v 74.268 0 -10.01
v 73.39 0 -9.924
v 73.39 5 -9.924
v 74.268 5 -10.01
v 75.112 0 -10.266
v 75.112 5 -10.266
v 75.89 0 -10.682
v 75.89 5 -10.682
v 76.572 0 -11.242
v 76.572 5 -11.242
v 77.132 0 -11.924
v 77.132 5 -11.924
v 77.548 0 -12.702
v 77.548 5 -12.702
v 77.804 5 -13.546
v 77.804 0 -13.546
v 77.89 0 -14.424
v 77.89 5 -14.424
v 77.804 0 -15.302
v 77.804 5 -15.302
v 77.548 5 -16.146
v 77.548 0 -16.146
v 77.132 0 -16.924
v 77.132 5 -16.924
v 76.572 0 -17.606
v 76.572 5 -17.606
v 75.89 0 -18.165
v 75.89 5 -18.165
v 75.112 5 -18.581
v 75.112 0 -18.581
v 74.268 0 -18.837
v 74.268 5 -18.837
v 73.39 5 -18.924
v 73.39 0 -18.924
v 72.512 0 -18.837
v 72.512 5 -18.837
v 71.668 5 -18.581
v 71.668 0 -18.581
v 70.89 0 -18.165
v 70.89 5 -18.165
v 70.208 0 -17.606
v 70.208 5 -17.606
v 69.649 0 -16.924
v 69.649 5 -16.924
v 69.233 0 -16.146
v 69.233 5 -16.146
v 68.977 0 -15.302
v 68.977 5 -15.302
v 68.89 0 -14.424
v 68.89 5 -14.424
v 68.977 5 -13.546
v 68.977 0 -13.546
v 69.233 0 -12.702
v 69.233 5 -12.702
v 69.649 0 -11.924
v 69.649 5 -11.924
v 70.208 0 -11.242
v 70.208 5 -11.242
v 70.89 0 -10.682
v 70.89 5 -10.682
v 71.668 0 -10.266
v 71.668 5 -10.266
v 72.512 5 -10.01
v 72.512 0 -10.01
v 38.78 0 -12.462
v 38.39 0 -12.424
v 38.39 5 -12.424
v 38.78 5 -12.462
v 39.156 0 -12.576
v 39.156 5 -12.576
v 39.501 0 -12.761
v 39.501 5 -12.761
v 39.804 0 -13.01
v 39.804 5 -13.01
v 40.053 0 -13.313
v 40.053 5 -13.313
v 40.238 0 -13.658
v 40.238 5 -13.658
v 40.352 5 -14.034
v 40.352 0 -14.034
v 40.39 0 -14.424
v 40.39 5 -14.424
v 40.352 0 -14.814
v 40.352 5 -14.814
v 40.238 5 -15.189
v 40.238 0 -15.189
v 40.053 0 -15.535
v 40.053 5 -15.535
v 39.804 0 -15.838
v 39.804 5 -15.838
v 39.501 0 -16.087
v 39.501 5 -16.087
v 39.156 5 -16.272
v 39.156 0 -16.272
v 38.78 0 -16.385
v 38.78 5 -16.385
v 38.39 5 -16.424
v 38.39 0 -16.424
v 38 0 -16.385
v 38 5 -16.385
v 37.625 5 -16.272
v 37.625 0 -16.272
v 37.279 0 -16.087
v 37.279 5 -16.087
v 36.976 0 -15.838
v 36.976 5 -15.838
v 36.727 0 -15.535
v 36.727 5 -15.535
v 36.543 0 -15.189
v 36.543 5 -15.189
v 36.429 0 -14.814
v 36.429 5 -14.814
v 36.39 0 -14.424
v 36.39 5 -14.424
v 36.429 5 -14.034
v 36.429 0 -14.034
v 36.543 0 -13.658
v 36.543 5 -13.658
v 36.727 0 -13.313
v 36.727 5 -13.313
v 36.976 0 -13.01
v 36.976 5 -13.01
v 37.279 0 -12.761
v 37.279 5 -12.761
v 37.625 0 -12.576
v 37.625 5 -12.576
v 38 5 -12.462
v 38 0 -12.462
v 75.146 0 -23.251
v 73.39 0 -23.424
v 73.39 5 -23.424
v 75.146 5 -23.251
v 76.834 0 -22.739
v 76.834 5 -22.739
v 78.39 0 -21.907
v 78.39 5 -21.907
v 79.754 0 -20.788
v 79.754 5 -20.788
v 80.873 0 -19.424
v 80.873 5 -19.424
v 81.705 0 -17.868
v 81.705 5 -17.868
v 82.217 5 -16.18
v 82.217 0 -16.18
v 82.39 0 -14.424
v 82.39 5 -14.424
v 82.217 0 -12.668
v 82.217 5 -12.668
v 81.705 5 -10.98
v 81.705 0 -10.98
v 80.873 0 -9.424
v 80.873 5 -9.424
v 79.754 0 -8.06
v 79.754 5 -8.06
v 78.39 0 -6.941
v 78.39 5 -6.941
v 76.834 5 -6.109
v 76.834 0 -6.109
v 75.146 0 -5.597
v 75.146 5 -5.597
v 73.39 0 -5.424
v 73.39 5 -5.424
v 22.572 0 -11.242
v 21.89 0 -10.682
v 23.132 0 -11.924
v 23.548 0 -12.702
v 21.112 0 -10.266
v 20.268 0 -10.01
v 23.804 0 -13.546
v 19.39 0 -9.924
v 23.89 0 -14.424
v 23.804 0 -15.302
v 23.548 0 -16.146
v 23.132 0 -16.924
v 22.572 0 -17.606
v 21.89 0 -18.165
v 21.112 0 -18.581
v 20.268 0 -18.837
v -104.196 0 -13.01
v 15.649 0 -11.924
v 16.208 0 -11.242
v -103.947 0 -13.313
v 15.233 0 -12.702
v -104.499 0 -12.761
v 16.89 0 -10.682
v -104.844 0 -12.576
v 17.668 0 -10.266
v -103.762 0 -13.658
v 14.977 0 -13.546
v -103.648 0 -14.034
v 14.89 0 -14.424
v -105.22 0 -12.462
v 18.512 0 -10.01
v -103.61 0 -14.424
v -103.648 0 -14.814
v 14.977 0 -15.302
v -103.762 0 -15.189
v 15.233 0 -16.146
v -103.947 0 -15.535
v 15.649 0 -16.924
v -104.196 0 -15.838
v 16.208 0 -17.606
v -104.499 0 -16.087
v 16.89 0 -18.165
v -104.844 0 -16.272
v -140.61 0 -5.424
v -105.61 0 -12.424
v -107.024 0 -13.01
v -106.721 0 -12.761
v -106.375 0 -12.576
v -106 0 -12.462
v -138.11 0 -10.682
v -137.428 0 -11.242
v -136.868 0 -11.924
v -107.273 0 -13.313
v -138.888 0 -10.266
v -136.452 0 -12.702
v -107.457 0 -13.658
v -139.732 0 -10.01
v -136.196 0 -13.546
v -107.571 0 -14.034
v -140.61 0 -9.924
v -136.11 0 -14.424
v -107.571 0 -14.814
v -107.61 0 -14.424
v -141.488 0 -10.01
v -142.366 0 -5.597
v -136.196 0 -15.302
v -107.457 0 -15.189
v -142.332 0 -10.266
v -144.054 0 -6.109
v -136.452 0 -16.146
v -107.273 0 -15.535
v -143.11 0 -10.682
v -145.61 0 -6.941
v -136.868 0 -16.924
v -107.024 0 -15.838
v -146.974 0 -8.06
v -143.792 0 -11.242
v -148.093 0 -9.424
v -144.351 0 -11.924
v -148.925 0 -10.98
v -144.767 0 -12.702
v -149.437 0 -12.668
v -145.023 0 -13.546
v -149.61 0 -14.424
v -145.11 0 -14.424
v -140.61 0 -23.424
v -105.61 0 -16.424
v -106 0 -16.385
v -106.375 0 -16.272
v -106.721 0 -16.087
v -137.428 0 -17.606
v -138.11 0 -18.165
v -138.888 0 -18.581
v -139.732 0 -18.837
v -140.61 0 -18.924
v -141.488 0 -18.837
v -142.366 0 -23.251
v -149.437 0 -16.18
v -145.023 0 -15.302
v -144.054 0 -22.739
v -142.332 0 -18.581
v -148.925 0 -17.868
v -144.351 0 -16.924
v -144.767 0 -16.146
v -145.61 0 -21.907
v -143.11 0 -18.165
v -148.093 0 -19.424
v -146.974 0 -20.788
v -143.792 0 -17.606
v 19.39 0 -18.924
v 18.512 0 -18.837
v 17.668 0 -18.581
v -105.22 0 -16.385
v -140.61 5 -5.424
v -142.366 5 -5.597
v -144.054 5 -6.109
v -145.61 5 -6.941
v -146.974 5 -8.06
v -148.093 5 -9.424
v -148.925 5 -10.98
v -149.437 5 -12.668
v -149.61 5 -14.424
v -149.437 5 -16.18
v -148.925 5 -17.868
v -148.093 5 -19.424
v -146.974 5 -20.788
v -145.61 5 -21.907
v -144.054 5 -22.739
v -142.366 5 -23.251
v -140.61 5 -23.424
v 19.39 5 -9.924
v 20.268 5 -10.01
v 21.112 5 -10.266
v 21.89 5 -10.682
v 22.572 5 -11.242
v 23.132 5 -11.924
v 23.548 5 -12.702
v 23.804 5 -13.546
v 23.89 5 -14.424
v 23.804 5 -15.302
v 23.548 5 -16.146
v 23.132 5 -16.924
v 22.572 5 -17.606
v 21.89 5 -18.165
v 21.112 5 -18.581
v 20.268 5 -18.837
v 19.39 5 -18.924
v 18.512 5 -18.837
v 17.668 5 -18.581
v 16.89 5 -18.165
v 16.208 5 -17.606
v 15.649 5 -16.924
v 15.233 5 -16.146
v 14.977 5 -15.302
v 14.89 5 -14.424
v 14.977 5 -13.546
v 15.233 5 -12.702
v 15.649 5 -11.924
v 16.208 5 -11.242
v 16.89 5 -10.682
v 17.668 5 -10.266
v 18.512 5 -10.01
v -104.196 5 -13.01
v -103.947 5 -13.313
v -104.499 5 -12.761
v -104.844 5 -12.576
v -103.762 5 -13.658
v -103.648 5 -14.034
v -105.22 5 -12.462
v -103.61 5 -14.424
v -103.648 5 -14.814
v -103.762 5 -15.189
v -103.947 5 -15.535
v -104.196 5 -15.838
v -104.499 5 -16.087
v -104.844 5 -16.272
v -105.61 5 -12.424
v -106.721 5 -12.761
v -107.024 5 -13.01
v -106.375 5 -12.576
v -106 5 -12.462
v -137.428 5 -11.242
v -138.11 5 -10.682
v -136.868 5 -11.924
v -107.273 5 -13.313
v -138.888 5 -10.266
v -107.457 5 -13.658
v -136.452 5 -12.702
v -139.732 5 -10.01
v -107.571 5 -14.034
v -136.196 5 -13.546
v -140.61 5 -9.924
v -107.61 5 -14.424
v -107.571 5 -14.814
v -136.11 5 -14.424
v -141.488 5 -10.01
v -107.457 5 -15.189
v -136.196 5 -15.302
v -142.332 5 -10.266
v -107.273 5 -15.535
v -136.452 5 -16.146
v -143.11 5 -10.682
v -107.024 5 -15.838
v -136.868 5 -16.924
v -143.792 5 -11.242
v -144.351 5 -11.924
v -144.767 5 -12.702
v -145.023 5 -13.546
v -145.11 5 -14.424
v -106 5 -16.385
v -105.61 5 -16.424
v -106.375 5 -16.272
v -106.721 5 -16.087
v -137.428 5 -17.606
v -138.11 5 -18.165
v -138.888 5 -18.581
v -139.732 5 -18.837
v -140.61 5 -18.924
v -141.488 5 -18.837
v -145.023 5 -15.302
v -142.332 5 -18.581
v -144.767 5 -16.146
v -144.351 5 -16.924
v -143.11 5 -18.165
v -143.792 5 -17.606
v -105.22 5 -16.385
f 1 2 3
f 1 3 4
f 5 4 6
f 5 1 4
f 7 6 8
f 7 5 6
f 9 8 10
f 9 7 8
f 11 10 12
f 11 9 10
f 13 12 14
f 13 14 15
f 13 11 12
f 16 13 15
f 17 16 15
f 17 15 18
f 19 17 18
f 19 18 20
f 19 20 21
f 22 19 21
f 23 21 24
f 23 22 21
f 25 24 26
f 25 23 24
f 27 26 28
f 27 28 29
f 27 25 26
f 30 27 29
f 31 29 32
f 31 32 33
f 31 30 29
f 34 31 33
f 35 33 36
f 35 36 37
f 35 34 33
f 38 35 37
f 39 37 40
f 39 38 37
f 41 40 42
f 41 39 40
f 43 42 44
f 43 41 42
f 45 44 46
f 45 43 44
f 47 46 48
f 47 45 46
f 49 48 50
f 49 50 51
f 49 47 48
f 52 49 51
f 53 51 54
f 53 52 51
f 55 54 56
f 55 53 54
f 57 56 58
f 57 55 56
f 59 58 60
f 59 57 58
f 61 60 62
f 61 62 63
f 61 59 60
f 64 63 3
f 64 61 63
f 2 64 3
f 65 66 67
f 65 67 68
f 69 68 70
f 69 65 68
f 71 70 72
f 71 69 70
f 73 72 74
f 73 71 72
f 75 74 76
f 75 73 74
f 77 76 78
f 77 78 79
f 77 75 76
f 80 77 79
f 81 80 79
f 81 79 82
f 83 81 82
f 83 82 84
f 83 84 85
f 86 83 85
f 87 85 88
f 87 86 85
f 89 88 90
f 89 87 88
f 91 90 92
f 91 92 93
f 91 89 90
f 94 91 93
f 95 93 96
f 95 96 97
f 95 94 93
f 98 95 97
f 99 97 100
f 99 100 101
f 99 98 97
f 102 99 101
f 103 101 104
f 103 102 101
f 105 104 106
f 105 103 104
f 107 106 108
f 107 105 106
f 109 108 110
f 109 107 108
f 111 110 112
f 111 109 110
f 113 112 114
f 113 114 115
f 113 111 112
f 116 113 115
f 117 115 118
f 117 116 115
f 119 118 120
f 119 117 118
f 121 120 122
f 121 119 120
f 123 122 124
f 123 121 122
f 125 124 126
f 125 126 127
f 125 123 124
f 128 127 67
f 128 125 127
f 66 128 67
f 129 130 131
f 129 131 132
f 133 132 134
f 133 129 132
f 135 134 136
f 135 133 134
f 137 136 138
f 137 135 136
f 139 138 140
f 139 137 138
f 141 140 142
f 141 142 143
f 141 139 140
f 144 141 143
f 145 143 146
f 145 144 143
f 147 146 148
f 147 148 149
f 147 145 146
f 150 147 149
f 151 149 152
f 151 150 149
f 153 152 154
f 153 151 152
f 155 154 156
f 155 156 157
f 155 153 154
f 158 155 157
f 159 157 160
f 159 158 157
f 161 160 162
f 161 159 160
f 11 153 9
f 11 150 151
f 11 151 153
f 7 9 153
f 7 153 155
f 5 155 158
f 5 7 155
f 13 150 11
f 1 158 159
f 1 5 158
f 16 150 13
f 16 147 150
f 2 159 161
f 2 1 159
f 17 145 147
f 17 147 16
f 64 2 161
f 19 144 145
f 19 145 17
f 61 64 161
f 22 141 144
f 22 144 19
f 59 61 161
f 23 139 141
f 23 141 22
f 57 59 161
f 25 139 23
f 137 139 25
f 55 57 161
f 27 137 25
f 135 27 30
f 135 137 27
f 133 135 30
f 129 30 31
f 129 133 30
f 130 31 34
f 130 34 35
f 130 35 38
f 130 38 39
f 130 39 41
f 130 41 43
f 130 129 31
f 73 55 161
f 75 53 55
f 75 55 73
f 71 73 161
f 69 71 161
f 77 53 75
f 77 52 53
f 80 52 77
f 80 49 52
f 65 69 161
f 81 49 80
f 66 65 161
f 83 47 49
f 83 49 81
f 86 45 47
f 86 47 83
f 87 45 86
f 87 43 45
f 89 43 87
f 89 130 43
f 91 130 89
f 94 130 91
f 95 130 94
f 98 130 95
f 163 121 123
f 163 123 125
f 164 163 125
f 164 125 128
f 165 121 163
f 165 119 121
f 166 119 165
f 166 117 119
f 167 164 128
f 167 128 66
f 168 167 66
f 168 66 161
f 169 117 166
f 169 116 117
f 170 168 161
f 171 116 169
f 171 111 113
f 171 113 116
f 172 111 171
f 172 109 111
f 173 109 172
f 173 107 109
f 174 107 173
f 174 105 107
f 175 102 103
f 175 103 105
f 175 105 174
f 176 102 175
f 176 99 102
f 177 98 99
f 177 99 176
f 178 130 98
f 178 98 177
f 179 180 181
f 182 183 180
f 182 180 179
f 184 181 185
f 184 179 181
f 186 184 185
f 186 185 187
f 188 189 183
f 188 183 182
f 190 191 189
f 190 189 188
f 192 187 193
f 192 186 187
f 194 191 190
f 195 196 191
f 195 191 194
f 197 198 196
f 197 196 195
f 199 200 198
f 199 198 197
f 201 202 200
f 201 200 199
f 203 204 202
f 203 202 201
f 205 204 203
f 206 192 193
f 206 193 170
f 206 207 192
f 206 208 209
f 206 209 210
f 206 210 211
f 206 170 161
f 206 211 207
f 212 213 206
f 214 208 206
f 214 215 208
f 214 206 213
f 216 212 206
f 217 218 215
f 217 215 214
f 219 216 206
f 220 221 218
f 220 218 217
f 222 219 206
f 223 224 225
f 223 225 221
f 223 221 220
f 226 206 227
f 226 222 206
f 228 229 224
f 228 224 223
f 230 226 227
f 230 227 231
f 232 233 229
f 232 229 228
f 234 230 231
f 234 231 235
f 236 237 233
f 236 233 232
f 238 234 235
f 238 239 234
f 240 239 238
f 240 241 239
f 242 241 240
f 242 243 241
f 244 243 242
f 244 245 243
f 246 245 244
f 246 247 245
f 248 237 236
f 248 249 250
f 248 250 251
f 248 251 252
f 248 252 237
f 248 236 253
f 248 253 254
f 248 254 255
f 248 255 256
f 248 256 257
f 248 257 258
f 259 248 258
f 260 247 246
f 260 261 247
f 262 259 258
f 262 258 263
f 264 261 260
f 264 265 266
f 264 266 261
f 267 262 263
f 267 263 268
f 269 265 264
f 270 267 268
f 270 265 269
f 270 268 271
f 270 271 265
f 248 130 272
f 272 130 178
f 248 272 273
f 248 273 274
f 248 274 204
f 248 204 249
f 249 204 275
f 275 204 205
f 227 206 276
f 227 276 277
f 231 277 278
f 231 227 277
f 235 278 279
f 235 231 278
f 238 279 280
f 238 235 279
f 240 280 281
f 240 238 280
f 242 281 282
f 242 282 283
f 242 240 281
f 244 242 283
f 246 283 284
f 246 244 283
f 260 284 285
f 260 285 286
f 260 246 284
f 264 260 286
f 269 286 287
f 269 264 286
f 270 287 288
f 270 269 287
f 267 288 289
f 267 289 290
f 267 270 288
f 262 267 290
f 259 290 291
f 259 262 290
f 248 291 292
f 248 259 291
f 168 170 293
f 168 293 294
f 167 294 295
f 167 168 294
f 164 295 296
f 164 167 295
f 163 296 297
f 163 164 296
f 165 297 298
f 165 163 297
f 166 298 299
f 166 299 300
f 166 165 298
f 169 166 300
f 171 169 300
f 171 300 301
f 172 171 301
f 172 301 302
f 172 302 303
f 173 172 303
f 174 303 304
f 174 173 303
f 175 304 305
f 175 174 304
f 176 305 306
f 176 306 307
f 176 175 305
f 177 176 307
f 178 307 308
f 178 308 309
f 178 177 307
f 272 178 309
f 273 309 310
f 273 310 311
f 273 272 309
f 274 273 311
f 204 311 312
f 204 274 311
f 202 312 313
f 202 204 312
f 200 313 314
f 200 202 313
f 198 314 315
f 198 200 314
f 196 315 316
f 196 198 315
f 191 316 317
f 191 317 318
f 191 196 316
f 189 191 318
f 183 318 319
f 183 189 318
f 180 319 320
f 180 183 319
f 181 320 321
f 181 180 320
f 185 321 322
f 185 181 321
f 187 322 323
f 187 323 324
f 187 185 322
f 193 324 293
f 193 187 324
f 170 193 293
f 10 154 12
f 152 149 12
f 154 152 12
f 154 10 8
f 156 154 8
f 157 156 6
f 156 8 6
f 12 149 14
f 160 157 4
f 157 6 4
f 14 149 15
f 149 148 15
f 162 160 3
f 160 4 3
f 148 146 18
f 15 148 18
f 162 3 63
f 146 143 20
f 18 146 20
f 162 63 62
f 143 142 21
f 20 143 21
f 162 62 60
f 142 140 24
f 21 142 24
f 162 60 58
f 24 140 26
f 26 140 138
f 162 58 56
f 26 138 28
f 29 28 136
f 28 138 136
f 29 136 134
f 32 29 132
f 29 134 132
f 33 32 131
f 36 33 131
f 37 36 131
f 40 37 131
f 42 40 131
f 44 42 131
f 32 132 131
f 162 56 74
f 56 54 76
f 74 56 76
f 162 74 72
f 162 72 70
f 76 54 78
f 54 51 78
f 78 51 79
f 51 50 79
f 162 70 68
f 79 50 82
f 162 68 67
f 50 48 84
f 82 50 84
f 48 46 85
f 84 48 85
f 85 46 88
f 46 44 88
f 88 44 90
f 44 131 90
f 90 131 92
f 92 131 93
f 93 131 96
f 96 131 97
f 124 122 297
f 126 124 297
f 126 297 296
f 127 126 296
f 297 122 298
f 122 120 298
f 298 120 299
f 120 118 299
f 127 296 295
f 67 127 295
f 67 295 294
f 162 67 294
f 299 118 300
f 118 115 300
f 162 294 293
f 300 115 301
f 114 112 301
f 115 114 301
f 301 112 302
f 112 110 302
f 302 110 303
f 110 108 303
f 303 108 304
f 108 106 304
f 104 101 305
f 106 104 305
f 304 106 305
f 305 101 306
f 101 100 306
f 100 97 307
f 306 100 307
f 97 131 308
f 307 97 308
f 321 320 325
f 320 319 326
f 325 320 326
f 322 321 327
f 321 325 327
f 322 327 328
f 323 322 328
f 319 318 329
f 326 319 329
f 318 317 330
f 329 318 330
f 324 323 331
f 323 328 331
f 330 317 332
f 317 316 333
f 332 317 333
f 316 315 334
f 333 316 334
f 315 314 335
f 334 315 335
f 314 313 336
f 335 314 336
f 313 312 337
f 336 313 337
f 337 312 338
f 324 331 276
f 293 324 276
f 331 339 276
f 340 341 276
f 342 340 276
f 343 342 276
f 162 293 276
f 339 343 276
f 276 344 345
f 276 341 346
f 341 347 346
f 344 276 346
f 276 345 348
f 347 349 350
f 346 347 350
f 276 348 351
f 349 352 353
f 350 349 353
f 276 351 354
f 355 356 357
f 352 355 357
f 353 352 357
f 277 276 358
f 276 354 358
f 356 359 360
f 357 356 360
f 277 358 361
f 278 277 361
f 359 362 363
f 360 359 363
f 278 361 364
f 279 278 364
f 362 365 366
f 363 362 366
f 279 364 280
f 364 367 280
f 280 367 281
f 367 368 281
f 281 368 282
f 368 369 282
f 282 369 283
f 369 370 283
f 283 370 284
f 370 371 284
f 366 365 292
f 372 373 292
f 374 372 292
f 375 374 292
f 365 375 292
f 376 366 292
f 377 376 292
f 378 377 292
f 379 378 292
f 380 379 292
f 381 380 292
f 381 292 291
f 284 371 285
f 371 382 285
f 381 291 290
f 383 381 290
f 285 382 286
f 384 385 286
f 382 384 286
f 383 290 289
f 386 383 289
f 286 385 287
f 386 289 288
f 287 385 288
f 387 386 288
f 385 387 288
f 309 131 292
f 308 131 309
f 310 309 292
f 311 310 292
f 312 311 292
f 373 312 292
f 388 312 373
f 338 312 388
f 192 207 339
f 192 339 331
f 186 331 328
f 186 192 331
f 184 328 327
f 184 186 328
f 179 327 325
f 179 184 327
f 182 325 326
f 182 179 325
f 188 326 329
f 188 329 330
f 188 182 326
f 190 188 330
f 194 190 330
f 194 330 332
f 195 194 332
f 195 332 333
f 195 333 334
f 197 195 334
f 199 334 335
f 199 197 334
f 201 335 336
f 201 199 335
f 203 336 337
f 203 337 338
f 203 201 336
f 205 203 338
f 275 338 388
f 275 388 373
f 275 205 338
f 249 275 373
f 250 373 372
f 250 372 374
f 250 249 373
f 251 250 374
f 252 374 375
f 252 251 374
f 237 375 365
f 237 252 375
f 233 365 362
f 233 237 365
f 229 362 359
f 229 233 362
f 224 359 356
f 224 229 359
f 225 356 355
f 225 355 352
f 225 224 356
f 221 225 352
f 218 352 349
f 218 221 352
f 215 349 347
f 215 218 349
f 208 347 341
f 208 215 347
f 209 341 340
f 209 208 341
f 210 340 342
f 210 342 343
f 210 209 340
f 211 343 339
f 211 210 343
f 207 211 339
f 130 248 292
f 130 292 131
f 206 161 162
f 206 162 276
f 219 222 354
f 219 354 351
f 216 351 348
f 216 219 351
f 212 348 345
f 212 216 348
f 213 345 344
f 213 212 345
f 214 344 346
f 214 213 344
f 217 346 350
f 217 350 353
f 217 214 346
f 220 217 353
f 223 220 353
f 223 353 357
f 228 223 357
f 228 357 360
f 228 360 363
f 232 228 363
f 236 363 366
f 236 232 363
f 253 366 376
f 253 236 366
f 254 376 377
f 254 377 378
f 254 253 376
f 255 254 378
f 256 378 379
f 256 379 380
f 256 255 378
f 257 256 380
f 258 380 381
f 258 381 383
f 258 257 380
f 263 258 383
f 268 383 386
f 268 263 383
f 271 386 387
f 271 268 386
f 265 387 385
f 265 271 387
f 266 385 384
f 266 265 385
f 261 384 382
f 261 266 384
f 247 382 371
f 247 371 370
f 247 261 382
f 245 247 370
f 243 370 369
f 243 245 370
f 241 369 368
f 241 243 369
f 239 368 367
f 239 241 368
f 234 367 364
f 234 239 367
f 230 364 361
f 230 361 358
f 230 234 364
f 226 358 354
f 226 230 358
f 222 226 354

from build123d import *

# Parameters (mm, degrees)
SKETCH_1_R      = 4.5
SKETCH_1_R_2    = 2
EXTRUDE_1_DEPTH = 5


with BuildPart() as part:
    # 草图1 → 凸台-拉伸1 (new body)
    with BuildSketch(Plane(origin=(0, 0, 0), x_dir=(1, 0, 0), z_dir=(0, 1, 0))):
        with BuildLine():
            Line((-140.609734673, 23.423817863), (73.390265327, 23.423817863))
            ThreePointArc((73.390265327, 23.423817863), (82.390265327, 14.423817863), (73.390265327, 5.423817863))
            Line((73.390265327, 5.423817863), (-140.609734673, 5.423817863))
            ThreePointArc((-140.609734673, 5.423817863), (-149.609734673, 14.423817863), (-140.609734673, 23.423817863))
        make_face()
        with Locations(Location((-140.609734673, 14.423817863, 0), (0, 0, 270))):
            Circle(SKETCH_1_R, mode=Mode.SUBTRACT)
        with Locations(Location((73.390265327, 14.423817863, 0), (0, 0, 270))):
            Circle(SKETCH_1_R, mode=Mode.SUBTRACT)
        with Locations(Location((38.390265327, 14.423817863, 0), (0, 0, 270))):
            Circle(SKETCH_1_R_2, mode=Mode.SUBTRACT)
        with Locations(Location((19.390265327, 14.423817863, 0), (0, 0, 270))):
            Circle(SKETCH_1_R, mode=Mode.SUBTRACT)
        with Locations(Location((-105.609734673, 14.423817863, 0), (0, 0, 270))):
            Circle(SKETCH_1_R_2, mode=Mode.SUBTRACT)
    extrude(amount=EXTRUDE_1_DEPTH)


solid = part.part
